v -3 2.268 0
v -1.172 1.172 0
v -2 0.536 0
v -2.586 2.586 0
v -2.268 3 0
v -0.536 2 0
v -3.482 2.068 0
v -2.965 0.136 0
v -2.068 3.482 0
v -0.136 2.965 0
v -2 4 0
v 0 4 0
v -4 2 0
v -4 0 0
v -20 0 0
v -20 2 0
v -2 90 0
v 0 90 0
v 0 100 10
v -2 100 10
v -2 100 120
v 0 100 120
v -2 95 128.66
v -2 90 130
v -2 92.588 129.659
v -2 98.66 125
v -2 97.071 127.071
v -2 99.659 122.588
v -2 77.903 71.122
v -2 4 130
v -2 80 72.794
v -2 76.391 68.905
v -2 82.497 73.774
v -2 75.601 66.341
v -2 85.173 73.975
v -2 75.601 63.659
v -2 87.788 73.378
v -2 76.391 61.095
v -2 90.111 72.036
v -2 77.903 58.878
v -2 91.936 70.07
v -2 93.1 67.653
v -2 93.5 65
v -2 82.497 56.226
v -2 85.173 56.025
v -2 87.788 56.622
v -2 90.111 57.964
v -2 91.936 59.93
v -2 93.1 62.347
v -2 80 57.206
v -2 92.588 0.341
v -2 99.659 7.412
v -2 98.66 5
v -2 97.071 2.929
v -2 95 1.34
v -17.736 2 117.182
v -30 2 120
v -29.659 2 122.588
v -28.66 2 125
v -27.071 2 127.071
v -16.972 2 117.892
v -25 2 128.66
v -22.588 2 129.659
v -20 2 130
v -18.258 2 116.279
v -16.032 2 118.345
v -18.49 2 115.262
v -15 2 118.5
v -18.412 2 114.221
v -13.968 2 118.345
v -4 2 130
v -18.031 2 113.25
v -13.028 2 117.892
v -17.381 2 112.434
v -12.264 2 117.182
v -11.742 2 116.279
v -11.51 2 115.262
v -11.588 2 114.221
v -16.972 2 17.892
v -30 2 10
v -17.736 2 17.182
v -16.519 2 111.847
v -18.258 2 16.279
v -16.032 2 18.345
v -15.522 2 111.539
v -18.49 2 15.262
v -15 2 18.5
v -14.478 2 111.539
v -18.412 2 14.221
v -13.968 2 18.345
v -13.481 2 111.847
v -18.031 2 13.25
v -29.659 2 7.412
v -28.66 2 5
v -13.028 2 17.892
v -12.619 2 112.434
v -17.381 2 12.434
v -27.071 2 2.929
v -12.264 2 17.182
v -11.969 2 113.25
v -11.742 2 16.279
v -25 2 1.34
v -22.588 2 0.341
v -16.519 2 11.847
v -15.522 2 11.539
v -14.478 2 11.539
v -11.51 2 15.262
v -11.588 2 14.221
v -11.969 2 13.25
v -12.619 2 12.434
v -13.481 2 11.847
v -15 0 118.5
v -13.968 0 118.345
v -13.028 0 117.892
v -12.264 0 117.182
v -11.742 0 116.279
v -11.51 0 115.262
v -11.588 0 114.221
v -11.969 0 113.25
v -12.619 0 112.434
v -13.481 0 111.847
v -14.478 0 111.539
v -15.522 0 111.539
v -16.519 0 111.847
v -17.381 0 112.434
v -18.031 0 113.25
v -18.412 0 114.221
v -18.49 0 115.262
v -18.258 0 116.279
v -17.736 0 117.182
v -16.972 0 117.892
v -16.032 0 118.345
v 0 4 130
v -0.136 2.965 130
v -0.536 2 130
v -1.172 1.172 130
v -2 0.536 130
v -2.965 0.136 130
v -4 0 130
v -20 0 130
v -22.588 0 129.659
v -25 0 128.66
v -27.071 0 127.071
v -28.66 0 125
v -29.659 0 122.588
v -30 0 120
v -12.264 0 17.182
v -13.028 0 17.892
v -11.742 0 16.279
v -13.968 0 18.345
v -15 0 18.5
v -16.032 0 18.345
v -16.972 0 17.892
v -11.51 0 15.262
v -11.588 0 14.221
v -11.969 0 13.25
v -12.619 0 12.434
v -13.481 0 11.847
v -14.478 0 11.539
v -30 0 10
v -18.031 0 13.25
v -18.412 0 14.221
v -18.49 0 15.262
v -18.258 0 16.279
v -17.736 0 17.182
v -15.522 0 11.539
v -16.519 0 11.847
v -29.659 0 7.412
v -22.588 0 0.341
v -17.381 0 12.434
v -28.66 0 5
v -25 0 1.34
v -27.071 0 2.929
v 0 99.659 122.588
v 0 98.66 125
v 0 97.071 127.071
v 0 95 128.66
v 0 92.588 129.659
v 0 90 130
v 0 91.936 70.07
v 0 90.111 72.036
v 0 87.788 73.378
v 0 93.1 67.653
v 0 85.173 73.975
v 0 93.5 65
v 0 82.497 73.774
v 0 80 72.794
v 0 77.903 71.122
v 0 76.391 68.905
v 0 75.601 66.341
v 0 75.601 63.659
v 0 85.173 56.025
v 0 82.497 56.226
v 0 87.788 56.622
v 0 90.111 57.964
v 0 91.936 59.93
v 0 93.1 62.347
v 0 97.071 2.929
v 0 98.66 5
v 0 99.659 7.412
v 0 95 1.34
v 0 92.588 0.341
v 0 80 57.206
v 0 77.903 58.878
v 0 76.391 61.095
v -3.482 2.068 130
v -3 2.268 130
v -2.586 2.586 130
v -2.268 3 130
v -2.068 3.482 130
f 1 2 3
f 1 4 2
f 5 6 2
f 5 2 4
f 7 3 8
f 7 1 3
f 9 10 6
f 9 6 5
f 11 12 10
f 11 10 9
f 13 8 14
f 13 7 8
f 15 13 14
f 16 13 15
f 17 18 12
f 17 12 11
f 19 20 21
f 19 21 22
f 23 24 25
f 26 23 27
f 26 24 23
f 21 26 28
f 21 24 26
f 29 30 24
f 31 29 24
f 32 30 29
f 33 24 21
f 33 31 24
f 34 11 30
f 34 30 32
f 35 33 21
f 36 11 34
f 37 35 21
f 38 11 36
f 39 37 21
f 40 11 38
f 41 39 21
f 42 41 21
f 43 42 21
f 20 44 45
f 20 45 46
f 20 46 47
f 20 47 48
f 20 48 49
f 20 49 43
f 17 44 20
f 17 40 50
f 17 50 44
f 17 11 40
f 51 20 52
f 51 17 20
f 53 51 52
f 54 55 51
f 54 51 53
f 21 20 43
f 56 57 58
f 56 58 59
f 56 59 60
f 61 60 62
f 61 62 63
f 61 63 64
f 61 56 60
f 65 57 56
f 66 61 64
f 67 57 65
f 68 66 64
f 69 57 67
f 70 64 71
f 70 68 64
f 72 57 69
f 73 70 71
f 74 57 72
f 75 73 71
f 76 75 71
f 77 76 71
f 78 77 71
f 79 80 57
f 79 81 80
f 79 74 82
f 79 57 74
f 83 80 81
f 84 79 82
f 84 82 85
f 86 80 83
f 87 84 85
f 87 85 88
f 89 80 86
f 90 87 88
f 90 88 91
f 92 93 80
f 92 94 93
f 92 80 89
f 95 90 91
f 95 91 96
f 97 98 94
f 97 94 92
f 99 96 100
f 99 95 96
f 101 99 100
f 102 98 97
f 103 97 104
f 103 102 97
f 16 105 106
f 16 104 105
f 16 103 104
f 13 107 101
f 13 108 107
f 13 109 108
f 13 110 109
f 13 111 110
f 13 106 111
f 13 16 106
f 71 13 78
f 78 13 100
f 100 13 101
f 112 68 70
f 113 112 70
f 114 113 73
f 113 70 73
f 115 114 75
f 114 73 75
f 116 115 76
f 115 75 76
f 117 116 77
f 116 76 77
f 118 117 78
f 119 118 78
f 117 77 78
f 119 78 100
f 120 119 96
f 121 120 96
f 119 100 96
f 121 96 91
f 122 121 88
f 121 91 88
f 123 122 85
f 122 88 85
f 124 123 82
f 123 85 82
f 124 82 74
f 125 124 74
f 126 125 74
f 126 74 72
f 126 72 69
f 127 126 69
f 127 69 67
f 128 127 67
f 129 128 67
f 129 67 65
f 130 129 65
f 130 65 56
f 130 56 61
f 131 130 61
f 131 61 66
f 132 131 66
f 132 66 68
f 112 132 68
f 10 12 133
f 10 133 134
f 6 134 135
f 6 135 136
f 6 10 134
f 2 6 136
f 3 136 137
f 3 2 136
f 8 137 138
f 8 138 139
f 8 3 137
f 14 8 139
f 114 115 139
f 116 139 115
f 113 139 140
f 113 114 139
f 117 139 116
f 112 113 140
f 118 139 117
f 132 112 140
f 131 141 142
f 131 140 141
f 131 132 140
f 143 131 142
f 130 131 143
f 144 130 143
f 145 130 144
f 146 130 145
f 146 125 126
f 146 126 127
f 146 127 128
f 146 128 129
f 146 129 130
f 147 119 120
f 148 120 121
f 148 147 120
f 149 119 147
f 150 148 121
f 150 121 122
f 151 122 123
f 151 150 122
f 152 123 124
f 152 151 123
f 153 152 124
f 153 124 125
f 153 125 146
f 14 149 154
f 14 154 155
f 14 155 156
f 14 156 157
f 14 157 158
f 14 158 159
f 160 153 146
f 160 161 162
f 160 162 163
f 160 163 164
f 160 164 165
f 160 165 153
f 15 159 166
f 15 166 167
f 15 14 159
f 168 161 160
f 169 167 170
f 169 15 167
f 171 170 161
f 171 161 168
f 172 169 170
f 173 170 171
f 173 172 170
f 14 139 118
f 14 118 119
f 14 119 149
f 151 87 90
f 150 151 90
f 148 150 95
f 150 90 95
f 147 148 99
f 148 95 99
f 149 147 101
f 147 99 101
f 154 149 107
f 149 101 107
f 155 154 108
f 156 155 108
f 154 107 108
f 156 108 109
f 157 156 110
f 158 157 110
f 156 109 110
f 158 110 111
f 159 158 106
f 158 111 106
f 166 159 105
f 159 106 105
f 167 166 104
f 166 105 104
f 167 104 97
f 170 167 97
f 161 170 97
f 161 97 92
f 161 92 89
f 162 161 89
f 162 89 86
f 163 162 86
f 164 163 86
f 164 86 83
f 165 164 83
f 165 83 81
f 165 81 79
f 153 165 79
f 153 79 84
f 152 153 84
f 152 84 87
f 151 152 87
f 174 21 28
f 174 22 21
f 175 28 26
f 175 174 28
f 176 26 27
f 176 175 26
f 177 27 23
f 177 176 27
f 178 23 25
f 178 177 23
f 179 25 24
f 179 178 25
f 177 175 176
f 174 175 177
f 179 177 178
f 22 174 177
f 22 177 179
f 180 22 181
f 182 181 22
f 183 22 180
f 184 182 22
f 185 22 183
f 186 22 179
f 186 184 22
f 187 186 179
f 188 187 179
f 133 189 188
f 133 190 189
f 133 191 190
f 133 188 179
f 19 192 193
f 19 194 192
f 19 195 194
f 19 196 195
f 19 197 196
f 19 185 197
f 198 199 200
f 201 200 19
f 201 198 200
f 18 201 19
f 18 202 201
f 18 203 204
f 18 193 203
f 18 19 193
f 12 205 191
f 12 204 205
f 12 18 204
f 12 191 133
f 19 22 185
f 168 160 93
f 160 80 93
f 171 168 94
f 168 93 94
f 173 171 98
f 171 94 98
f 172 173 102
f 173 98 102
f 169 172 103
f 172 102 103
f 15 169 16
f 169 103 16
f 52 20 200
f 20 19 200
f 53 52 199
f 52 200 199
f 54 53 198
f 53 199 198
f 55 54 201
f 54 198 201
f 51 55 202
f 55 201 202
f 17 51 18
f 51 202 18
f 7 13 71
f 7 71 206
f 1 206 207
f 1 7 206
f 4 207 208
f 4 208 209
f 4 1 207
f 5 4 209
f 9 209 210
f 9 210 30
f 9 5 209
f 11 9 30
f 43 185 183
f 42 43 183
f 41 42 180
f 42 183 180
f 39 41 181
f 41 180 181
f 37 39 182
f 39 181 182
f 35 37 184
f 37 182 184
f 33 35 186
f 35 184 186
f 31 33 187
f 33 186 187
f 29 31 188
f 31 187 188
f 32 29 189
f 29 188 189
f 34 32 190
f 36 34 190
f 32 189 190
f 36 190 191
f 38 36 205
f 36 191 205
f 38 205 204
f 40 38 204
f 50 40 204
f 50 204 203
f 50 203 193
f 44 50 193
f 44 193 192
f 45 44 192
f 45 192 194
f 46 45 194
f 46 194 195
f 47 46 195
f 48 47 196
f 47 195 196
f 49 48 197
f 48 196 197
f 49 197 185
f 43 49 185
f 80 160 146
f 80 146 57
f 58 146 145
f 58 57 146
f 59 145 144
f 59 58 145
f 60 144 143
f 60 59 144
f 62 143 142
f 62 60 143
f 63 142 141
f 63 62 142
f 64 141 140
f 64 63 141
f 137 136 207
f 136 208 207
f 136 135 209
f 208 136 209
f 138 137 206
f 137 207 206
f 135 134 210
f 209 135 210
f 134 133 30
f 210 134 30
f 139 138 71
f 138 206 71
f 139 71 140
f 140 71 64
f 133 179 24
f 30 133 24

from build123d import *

# Parameters (mm, degrees)
BASE_FLANGE1_DEPTH = 130
FILLET1_R          = 10
SKETCH6_R          = 3.5
CUT_EXTRUDE1_DEPTH = 10
SKETCH7_R          = 9
CUT_EXTRUDE2_DEPTH = 2


# Sheet-metal steps are written as plain solids
with BuildPart() as part:
    # Sketch1 → Base-Flange1 (new body)
    with BuildSketch(Plane.XY):
        with BuildLine():
            Line((0, 100), (0, 4))
            ThreePointArc((0, 4), (-1.171572875, 1.171572875), (-4, 0))
            Line((-4, 0), (-30, 0))
            Line((-30, 0), (-30, 2))
            Line((-30, 2), (-4, 2))
            ThreePointArc((-4, 2), (-2.585786438, 2.585786438), (-2, 4))
            Line((-2, 4), (-2, 100))
            Line((-2, 100), (0, 100))
        make_face()
    extrude(amount=BASE_FLANGE1_DEPTH)

    # Fillet1
    fillet1_edges = [part.edges().sort_by_distance(p)[0] for p in [
        (-1, 100, 130),
        (-1, 100, 0),
        (-30, 1, 130),
        (-30, 1, 0),
    ]]
    fillet(fillet1_edges, radius=FILLET1_R)

    # Sketch6 → Cut-Extrude1 (cut)
    with BuildSketch(Plane(origin=(0, 2, 0), x_dir=(1, 0, 0), z_dir=(0, 1, 0))):
        with Locations(Location((-15, -15, 0), (0, 0, 270))):
            Circle(SKETCH6_R)
        with Locations(Location((-15, -115, 0), (0, 0, 270))):
            Circle(SKETCH6_R)
    extrude(amount=-CUT_EXTRUDE1_DEPTH, mode=Mode.SUBTRACT)

    # Sketch7 → Cut-Extrude2 (cut)
    with BuildSketch(Plane(origin=(0, 0, 0), x_dir=(0, 0, -1), z_dir=(1, 0, 0))):
        with Locations(Location((-65, 84.499999997, 0), (0, 0, 90))):
            Circle(SKETCH7_R)
    extrude(amount=-CUT_EXTRUDE2_DEPTH, mode=Mode.SUBTRACT)


solid = part.part
